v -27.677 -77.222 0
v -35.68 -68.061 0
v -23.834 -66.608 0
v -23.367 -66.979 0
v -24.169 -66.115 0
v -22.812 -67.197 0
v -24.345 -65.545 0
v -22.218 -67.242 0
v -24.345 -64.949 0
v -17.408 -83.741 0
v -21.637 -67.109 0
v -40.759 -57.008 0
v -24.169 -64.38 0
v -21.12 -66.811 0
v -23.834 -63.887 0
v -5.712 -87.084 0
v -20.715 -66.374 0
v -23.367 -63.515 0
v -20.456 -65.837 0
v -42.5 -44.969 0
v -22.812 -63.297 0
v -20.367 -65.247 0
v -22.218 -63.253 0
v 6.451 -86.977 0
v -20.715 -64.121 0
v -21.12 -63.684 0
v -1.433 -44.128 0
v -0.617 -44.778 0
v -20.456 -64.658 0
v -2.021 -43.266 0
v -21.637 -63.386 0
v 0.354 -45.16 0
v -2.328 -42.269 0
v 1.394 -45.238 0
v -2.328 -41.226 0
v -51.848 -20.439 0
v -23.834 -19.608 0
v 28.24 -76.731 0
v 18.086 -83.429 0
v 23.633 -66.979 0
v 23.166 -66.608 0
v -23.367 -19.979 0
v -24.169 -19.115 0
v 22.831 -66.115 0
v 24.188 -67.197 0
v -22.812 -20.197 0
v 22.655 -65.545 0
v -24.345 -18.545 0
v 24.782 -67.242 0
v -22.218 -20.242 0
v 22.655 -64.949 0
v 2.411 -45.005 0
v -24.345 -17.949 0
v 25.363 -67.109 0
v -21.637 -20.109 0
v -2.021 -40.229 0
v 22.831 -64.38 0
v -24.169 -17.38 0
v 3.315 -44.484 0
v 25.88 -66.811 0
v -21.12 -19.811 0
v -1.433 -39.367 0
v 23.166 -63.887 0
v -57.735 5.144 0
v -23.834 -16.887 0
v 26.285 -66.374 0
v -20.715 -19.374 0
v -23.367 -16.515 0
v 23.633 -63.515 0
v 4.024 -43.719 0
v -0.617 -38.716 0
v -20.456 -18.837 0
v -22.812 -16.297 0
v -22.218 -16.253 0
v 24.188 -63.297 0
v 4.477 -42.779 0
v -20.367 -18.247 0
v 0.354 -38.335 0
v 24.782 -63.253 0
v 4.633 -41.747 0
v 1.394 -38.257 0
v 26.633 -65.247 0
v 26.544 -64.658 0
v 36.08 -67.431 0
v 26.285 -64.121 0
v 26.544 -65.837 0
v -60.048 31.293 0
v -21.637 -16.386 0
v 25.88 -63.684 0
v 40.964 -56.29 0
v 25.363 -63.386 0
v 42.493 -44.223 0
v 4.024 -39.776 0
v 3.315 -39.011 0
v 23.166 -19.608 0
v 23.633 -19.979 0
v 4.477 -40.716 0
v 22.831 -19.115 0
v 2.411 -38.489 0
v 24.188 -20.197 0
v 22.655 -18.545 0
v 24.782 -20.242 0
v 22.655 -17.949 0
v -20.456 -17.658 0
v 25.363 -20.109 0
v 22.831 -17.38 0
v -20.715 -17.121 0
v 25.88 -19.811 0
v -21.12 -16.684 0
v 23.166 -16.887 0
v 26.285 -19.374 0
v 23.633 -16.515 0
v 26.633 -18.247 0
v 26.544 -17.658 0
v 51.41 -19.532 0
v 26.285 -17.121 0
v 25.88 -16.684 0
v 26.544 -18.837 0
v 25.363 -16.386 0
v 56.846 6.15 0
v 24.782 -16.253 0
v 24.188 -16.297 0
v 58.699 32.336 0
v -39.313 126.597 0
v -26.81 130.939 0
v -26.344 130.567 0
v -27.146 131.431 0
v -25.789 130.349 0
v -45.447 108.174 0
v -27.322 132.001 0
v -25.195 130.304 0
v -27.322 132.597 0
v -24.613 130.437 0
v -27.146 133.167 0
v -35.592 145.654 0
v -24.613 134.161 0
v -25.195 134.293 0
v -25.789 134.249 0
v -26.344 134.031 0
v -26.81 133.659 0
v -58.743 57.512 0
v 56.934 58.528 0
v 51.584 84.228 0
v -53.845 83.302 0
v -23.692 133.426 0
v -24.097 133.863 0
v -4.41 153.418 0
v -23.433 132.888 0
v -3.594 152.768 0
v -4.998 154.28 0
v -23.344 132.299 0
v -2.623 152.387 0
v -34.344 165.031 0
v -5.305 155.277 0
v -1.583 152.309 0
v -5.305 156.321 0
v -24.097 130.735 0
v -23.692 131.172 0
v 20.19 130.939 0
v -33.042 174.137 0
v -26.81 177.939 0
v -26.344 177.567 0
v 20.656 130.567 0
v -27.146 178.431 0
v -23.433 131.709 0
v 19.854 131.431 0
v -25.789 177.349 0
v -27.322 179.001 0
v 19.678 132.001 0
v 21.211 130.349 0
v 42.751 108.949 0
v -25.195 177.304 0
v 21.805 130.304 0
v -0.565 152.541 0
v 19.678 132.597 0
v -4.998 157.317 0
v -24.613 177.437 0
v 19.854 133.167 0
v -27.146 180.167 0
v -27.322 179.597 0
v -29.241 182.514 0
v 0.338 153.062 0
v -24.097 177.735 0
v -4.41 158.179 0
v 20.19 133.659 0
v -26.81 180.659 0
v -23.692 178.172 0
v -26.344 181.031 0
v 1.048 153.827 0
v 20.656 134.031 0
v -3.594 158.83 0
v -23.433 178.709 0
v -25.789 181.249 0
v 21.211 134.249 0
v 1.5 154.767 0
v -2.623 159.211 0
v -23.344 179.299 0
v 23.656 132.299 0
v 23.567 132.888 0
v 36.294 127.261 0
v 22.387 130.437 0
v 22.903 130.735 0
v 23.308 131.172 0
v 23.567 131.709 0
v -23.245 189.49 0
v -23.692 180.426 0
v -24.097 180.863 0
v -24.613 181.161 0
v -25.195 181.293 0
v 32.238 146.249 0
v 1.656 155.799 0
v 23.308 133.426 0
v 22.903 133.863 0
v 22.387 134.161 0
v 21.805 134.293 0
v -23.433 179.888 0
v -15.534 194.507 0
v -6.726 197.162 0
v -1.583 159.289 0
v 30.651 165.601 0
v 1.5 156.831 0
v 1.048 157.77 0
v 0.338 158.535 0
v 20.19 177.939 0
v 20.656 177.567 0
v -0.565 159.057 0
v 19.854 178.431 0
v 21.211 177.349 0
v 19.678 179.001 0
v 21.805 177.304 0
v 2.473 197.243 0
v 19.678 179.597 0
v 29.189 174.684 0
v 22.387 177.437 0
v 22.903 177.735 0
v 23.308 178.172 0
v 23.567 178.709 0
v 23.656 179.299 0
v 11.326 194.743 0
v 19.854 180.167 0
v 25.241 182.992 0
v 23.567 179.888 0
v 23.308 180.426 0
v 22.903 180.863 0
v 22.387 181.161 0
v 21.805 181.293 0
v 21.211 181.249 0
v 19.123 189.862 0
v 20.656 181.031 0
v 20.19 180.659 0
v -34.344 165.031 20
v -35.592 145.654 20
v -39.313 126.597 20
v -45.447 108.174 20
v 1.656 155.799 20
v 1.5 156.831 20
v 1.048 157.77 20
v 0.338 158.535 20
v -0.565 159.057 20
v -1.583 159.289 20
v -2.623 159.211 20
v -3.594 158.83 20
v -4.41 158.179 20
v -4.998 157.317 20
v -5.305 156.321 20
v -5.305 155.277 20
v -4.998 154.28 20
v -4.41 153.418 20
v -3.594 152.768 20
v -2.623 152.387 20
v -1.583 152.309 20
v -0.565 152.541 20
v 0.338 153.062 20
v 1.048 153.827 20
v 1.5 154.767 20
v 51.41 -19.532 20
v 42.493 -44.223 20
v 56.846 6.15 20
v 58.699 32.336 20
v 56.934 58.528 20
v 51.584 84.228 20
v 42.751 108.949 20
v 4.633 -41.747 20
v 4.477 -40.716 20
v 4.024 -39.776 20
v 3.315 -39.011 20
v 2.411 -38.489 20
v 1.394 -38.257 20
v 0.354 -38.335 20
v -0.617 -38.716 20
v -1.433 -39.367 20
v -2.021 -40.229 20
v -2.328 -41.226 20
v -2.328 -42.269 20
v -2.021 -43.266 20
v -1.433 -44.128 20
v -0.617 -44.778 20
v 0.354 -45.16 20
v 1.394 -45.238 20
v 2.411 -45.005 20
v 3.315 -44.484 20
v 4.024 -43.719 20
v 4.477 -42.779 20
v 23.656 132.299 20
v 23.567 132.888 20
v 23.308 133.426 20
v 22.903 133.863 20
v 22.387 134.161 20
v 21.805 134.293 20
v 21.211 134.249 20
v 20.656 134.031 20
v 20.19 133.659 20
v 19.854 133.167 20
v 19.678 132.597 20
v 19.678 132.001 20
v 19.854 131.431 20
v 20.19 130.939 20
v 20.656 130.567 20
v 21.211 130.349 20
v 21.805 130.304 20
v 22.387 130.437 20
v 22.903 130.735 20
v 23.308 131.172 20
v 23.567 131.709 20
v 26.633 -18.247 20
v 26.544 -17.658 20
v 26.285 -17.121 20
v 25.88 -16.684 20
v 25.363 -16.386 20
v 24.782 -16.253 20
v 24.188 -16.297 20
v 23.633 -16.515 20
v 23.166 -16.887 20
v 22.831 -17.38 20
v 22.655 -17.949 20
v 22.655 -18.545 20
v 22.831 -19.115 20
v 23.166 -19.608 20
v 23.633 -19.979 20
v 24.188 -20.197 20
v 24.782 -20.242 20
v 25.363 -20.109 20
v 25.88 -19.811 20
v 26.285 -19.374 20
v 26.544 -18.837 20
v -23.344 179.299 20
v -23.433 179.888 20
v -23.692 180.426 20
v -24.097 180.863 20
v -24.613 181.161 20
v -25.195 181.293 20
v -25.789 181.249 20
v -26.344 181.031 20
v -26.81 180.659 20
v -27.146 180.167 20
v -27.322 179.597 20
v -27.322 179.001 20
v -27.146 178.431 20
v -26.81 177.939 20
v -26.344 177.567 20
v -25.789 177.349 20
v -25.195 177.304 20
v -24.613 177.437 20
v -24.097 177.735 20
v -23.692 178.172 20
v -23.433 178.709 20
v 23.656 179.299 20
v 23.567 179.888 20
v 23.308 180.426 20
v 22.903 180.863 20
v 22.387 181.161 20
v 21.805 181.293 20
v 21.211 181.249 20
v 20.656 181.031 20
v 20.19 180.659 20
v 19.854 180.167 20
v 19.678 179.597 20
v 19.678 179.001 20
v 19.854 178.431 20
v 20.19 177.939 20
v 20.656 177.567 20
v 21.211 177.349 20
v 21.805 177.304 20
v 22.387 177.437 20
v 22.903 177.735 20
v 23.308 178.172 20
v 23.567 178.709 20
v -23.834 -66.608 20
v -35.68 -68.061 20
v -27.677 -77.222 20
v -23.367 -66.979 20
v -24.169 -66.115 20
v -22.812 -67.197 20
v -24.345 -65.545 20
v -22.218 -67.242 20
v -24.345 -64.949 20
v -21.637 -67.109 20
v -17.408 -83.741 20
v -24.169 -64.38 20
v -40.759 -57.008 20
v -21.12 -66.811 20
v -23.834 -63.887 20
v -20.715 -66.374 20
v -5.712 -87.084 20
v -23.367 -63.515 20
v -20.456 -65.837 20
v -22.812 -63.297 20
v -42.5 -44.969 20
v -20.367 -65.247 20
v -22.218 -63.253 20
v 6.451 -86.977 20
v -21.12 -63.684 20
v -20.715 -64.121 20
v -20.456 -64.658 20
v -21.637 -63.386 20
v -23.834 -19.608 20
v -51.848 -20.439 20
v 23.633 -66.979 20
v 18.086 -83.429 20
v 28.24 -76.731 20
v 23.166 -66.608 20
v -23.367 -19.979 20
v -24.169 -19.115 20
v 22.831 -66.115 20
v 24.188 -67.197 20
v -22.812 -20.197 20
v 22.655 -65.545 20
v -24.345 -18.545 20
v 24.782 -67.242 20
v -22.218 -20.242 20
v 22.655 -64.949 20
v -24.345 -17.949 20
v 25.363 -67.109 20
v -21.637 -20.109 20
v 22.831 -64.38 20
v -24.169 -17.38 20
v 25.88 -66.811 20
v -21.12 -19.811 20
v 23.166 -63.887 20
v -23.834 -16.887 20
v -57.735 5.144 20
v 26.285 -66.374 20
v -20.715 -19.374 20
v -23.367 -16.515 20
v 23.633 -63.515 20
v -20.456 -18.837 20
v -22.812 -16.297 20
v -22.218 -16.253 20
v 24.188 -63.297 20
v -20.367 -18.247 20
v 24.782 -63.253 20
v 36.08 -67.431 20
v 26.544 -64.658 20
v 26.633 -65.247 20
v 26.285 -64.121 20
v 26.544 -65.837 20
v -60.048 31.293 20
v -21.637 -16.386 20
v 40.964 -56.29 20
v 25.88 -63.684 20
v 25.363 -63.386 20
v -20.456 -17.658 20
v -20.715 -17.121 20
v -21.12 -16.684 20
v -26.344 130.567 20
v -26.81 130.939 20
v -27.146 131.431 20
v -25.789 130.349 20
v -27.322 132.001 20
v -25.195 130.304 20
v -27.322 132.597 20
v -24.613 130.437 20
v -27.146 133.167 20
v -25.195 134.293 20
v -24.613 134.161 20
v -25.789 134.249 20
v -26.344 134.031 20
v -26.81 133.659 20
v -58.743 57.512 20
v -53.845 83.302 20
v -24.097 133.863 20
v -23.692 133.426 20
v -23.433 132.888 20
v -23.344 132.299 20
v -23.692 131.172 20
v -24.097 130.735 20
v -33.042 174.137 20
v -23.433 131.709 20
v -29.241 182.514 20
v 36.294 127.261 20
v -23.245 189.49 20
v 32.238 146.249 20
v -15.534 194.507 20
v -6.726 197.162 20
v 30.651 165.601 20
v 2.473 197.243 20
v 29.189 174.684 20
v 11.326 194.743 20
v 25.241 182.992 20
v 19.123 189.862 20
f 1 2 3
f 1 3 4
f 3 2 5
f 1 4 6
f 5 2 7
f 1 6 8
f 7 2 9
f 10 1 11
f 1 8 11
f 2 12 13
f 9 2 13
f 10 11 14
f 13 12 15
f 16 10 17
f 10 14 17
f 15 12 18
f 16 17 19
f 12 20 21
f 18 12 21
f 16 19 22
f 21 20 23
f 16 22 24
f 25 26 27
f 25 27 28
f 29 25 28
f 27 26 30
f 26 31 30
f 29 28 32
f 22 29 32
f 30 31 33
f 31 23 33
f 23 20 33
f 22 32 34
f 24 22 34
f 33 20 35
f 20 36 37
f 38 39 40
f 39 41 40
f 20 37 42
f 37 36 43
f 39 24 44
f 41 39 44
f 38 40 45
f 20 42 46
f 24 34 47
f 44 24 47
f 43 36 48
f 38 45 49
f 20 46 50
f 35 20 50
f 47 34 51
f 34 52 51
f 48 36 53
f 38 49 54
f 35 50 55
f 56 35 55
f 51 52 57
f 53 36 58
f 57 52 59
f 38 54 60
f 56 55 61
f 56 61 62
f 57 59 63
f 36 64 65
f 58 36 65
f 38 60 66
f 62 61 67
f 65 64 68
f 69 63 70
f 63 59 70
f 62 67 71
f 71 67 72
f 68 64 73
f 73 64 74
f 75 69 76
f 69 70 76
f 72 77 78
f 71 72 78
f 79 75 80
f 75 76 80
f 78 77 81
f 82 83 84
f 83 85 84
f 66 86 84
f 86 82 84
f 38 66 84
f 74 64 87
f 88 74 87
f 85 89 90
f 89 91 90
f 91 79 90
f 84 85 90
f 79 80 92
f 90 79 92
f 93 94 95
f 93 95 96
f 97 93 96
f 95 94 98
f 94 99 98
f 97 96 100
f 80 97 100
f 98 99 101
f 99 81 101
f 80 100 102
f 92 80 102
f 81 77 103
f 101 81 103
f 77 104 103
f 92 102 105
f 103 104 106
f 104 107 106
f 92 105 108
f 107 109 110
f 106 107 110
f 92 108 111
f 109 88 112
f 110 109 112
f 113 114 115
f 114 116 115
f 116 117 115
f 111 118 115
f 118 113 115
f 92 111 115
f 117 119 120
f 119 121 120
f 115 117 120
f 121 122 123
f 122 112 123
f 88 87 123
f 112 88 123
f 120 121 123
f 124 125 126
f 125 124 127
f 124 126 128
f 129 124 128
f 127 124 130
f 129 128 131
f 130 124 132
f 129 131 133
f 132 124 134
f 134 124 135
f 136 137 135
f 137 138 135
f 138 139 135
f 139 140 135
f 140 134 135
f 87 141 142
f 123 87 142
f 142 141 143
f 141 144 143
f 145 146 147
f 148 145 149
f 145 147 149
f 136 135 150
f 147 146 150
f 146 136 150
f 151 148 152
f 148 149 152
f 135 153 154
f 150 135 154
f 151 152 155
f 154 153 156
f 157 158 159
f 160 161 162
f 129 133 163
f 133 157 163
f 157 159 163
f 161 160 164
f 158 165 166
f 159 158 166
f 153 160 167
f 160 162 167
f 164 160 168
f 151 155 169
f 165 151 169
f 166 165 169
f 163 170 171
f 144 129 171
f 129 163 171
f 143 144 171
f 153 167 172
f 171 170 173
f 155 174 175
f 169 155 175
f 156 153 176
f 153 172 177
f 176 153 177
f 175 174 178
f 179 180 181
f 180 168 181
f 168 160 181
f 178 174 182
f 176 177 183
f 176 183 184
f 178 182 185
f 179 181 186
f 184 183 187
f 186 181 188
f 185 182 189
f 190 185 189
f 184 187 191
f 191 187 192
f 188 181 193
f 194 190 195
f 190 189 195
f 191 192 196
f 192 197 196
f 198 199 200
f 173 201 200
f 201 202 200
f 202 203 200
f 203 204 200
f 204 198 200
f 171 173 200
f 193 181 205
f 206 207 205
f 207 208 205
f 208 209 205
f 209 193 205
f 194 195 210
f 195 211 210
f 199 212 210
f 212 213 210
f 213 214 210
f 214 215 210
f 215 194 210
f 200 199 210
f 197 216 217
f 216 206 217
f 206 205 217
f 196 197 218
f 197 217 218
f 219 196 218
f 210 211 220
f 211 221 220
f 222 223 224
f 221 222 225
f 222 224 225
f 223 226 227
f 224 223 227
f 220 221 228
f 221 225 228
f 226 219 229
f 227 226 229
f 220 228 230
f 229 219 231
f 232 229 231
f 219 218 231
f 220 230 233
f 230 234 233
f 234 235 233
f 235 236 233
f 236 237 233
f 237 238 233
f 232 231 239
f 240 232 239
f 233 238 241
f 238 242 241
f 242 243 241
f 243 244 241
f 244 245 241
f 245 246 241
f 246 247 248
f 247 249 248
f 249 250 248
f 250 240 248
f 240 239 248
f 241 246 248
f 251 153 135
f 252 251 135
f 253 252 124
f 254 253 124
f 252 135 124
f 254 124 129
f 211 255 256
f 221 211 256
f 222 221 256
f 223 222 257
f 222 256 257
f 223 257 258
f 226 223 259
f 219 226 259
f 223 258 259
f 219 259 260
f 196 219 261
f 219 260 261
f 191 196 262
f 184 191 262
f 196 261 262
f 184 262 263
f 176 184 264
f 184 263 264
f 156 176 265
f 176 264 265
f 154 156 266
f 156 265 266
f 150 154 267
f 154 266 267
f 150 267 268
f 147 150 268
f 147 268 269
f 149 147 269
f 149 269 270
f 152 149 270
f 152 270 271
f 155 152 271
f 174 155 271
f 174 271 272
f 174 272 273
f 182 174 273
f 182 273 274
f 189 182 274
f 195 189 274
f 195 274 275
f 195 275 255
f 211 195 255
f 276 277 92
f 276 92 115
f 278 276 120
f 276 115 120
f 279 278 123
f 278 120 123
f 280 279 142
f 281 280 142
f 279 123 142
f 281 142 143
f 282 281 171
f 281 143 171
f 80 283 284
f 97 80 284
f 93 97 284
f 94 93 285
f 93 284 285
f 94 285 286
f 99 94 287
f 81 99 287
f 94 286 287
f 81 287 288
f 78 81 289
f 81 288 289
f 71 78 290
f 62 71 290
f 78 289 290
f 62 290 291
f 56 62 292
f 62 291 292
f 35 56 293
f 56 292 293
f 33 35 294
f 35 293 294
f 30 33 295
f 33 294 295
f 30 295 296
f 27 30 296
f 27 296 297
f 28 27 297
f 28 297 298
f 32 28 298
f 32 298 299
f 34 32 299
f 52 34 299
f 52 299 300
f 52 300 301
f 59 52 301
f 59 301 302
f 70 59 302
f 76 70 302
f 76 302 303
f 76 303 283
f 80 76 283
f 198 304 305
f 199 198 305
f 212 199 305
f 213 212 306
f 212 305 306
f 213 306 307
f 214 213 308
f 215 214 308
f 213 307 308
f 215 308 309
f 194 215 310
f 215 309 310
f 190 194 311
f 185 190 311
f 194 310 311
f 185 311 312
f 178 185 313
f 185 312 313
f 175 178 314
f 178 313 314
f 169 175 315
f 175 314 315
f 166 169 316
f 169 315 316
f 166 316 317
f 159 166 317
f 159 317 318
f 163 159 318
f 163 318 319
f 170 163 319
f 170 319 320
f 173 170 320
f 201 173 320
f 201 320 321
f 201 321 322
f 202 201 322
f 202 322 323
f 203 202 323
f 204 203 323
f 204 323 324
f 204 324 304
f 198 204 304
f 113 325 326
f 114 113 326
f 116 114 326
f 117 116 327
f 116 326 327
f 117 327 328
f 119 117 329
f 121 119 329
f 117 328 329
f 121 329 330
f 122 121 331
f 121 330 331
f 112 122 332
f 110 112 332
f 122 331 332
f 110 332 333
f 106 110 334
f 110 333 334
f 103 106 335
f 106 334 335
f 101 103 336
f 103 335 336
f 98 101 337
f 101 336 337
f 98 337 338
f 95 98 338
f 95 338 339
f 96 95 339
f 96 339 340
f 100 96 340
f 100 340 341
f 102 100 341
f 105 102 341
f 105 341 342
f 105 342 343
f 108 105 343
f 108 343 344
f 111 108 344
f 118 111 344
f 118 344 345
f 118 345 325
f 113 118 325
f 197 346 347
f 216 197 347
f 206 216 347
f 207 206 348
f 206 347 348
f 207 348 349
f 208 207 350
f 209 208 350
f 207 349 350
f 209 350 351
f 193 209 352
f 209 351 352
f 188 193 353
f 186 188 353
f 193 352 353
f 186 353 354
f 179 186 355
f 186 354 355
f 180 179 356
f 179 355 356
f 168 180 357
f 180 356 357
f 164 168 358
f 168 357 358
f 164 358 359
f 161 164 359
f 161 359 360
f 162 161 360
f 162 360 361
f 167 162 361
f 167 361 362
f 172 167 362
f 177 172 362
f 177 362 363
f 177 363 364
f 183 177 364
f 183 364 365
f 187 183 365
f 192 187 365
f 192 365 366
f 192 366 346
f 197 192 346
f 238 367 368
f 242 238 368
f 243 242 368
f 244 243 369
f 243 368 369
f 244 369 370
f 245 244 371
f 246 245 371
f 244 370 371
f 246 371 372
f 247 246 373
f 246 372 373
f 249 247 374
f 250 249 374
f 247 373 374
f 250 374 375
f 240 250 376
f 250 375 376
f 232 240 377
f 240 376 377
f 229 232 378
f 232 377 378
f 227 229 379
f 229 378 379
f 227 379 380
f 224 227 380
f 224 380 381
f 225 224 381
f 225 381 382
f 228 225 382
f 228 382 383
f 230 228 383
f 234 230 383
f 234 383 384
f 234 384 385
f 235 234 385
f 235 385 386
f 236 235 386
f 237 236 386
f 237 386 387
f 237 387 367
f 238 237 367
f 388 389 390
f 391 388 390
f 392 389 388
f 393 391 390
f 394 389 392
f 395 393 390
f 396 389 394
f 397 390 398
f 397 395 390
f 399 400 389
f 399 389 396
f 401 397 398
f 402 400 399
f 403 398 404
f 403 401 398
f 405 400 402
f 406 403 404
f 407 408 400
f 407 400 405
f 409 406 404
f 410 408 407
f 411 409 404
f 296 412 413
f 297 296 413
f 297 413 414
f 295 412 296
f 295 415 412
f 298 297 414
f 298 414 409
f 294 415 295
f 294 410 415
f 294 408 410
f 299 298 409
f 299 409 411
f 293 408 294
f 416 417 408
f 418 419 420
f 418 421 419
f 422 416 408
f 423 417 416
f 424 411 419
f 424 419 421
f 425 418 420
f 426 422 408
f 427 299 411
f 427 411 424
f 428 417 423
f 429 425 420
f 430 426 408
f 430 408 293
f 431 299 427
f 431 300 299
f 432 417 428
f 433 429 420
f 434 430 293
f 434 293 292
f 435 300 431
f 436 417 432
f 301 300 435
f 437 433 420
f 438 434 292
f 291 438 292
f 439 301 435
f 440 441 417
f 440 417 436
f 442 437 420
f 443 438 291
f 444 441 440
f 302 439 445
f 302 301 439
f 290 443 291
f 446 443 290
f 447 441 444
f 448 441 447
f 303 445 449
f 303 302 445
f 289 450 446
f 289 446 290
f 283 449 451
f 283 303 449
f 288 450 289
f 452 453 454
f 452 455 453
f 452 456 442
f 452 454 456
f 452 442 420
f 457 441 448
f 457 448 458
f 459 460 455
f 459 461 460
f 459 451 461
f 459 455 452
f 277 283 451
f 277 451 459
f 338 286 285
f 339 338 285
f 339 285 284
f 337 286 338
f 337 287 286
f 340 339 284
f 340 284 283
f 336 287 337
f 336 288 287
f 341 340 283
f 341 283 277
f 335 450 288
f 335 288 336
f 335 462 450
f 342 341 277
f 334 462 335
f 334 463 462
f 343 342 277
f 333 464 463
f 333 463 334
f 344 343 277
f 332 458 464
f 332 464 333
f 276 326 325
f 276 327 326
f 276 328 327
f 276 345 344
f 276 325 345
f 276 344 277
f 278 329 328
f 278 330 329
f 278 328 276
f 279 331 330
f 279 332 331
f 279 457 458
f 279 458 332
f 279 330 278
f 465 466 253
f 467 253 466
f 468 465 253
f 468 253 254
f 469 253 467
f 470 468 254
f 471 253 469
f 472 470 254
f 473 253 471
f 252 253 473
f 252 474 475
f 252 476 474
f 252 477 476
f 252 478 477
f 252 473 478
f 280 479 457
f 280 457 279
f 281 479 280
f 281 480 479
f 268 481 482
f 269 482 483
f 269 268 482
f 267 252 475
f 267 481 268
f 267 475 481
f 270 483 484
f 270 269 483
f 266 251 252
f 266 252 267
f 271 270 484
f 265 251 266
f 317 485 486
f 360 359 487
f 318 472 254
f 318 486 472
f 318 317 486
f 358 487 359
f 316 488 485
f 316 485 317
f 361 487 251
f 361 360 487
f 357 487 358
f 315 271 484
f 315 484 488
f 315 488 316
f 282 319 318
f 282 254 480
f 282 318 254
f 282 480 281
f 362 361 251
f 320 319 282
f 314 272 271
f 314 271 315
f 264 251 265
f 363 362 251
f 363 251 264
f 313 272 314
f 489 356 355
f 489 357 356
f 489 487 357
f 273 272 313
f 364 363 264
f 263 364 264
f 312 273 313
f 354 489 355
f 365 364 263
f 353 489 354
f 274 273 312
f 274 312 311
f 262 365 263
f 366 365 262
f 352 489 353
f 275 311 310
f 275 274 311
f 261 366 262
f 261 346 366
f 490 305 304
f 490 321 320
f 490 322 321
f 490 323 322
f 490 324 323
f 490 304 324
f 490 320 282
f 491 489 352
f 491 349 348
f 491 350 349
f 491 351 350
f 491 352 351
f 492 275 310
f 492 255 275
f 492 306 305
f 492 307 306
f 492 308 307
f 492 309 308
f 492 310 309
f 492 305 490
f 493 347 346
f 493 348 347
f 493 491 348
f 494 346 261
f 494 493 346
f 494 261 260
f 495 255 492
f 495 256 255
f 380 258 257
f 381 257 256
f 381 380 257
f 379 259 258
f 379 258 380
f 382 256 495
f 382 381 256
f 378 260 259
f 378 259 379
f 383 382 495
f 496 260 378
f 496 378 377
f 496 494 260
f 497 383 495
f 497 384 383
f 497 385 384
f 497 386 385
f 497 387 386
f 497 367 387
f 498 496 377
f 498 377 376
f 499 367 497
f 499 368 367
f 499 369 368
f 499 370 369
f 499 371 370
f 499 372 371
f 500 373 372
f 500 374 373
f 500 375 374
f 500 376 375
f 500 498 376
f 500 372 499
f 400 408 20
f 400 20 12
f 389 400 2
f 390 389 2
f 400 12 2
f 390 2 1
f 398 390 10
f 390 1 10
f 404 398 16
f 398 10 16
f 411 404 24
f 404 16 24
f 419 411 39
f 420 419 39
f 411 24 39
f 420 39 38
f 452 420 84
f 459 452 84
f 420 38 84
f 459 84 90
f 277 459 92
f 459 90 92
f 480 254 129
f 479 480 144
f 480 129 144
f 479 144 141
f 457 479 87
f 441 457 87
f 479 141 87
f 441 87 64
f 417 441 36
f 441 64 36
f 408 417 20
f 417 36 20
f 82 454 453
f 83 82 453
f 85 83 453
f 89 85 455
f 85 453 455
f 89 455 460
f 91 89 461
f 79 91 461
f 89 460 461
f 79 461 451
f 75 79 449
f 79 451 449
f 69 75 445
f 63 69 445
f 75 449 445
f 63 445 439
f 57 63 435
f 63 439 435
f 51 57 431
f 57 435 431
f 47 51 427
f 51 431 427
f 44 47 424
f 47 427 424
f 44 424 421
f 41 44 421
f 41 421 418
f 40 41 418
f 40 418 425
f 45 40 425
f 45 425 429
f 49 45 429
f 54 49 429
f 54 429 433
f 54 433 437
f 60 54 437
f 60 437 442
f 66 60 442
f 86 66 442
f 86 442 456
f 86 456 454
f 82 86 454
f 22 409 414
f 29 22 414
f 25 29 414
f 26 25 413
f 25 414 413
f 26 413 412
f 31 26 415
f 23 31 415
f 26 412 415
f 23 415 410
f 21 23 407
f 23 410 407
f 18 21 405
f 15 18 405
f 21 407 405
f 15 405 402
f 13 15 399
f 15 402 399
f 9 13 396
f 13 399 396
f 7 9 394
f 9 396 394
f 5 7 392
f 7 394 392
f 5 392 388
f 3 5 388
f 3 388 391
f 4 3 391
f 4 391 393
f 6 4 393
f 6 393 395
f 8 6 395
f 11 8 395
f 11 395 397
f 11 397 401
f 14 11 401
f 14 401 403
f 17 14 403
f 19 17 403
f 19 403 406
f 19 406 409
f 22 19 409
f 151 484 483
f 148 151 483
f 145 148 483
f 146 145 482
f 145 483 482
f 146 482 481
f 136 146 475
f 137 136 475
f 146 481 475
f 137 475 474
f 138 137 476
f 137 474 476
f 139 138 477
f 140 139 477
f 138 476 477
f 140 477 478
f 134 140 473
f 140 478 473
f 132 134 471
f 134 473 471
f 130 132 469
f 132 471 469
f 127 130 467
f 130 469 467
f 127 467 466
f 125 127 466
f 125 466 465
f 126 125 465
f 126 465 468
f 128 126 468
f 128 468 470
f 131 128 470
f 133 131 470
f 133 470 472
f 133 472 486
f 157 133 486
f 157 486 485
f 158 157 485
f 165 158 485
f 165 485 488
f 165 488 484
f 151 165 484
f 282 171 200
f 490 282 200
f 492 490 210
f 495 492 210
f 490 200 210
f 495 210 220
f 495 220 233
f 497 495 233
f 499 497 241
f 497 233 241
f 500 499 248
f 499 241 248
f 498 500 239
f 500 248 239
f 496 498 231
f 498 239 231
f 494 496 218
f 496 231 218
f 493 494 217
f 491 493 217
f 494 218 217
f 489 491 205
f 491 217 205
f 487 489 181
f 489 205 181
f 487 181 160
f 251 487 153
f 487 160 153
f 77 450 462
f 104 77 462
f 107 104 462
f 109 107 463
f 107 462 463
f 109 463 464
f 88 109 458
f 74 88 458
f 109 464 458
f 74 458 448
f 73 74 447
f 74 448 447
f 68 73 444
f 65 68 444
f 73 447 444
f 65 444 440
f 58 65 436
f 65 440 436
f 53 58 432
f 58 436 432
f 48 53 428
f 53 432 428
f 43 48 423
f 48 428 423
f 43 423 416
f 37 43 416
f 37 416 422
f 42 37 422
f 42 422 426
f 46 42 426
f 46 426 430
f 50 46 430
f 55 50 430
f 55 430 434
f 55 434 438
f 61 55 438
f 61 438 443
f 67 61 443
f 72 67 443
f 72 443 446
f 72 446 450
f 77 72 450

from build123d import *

# Parameters (mm, degrees)
BOSS_EXTRUDE1_DEPTH = 20
SKETCH2_R           = 3.5
SKETCH2_R_2         = 2
CUT_EXTRUDE6_DEPTH  = 208.432644896
SKETCH4_R           = 3.5
SKETCH4_R_2         = 2
CUT_EXTRUDE8_DEPTH  = 208.432644896


with BuildPart() as part:
    # Sketch1 → Boss-Extrude1 (new body)
    with BuildSketch(Plane.XY):
        with BuildLine():
            ThreePointArc((-42.5, -44.96942423), (0.373210889, -87.467785535), (42.493445347, -44.223031232))
            ThreePointArc((42.493445347, -44.223031232), (58.699206053, 32.335771546), (42.750578742, 108.948552787))
            ThreePointArc((42.750578742, 108.948552787), (33.960784088, 136.689765999), (30.650815647, 165.601346886))
            ThreePointArc((30.650815647, 165.601346886), (-2.129568534, 197.52932265), (-34.344171972, 165.03057577))
            ThreePointArc((-34.344171972, 165.03057577), (-37.145879301, 136.065323543), (-45.447121923, 108.174020751))
            ThreePointArc((-45.447121923, 108.174020751), (-60.04780144, 31.292962484), (-42.5, -44.96942423))
        make_face()
    extrude(amount=BOSS_EXTRUDE1_DEPTH)

    # Sketch2 → Cut-Extrude6 (cut, through all)
    with BuildSketch(Plane.XY.offset(20)):
        with Locations((-1.844171972, 155.798868961)):
            Circle(SKETCH2_R)
        with Locations((21.655828028, 179.298868961)):
            Circle(SKETCH2_R_2)
        with Locations((-25.344171972, 179.298868961)):
            Circle(SKETCH2_R_2)
        with Locations((21.655828028, 132.298868961)):
            Circle(SKETCH2_R_2)
        with Locations((-25.344171972, 132.298868961)):
            Circle(SKETCH2_R_2)
    extrude(amount=-CUT_EXTRUDE6_DEPTH, mode=Mode.SUBTRACT)

    # Sketch4 → Cut-Extrude8 (cut, through all)
    with BuildSketch(Plane.XY.offset(20)):
        with Locations((1.132601083, -41.747329739)):
            Circle(SKETCH4_R)
        with Locations((24.632601083, -18.247329739)):
            Circle(SKETCH4_R_2)
        with Locations((-22.367398917, -18.247329739)):
            Circle(SKETCH4_R_2)
        with Locations((24.632601083, -65.247329739)):
            Circle(SKETCH4_R_2)
        with Locations((-22.367398917, -65.247329739)):
            Circle(SKETCH4_R_2)
    extrude(amount=-CUT_EXTRUDE8_DEPTH, mode=Mode.SUBTRACT)


solid = part.part
